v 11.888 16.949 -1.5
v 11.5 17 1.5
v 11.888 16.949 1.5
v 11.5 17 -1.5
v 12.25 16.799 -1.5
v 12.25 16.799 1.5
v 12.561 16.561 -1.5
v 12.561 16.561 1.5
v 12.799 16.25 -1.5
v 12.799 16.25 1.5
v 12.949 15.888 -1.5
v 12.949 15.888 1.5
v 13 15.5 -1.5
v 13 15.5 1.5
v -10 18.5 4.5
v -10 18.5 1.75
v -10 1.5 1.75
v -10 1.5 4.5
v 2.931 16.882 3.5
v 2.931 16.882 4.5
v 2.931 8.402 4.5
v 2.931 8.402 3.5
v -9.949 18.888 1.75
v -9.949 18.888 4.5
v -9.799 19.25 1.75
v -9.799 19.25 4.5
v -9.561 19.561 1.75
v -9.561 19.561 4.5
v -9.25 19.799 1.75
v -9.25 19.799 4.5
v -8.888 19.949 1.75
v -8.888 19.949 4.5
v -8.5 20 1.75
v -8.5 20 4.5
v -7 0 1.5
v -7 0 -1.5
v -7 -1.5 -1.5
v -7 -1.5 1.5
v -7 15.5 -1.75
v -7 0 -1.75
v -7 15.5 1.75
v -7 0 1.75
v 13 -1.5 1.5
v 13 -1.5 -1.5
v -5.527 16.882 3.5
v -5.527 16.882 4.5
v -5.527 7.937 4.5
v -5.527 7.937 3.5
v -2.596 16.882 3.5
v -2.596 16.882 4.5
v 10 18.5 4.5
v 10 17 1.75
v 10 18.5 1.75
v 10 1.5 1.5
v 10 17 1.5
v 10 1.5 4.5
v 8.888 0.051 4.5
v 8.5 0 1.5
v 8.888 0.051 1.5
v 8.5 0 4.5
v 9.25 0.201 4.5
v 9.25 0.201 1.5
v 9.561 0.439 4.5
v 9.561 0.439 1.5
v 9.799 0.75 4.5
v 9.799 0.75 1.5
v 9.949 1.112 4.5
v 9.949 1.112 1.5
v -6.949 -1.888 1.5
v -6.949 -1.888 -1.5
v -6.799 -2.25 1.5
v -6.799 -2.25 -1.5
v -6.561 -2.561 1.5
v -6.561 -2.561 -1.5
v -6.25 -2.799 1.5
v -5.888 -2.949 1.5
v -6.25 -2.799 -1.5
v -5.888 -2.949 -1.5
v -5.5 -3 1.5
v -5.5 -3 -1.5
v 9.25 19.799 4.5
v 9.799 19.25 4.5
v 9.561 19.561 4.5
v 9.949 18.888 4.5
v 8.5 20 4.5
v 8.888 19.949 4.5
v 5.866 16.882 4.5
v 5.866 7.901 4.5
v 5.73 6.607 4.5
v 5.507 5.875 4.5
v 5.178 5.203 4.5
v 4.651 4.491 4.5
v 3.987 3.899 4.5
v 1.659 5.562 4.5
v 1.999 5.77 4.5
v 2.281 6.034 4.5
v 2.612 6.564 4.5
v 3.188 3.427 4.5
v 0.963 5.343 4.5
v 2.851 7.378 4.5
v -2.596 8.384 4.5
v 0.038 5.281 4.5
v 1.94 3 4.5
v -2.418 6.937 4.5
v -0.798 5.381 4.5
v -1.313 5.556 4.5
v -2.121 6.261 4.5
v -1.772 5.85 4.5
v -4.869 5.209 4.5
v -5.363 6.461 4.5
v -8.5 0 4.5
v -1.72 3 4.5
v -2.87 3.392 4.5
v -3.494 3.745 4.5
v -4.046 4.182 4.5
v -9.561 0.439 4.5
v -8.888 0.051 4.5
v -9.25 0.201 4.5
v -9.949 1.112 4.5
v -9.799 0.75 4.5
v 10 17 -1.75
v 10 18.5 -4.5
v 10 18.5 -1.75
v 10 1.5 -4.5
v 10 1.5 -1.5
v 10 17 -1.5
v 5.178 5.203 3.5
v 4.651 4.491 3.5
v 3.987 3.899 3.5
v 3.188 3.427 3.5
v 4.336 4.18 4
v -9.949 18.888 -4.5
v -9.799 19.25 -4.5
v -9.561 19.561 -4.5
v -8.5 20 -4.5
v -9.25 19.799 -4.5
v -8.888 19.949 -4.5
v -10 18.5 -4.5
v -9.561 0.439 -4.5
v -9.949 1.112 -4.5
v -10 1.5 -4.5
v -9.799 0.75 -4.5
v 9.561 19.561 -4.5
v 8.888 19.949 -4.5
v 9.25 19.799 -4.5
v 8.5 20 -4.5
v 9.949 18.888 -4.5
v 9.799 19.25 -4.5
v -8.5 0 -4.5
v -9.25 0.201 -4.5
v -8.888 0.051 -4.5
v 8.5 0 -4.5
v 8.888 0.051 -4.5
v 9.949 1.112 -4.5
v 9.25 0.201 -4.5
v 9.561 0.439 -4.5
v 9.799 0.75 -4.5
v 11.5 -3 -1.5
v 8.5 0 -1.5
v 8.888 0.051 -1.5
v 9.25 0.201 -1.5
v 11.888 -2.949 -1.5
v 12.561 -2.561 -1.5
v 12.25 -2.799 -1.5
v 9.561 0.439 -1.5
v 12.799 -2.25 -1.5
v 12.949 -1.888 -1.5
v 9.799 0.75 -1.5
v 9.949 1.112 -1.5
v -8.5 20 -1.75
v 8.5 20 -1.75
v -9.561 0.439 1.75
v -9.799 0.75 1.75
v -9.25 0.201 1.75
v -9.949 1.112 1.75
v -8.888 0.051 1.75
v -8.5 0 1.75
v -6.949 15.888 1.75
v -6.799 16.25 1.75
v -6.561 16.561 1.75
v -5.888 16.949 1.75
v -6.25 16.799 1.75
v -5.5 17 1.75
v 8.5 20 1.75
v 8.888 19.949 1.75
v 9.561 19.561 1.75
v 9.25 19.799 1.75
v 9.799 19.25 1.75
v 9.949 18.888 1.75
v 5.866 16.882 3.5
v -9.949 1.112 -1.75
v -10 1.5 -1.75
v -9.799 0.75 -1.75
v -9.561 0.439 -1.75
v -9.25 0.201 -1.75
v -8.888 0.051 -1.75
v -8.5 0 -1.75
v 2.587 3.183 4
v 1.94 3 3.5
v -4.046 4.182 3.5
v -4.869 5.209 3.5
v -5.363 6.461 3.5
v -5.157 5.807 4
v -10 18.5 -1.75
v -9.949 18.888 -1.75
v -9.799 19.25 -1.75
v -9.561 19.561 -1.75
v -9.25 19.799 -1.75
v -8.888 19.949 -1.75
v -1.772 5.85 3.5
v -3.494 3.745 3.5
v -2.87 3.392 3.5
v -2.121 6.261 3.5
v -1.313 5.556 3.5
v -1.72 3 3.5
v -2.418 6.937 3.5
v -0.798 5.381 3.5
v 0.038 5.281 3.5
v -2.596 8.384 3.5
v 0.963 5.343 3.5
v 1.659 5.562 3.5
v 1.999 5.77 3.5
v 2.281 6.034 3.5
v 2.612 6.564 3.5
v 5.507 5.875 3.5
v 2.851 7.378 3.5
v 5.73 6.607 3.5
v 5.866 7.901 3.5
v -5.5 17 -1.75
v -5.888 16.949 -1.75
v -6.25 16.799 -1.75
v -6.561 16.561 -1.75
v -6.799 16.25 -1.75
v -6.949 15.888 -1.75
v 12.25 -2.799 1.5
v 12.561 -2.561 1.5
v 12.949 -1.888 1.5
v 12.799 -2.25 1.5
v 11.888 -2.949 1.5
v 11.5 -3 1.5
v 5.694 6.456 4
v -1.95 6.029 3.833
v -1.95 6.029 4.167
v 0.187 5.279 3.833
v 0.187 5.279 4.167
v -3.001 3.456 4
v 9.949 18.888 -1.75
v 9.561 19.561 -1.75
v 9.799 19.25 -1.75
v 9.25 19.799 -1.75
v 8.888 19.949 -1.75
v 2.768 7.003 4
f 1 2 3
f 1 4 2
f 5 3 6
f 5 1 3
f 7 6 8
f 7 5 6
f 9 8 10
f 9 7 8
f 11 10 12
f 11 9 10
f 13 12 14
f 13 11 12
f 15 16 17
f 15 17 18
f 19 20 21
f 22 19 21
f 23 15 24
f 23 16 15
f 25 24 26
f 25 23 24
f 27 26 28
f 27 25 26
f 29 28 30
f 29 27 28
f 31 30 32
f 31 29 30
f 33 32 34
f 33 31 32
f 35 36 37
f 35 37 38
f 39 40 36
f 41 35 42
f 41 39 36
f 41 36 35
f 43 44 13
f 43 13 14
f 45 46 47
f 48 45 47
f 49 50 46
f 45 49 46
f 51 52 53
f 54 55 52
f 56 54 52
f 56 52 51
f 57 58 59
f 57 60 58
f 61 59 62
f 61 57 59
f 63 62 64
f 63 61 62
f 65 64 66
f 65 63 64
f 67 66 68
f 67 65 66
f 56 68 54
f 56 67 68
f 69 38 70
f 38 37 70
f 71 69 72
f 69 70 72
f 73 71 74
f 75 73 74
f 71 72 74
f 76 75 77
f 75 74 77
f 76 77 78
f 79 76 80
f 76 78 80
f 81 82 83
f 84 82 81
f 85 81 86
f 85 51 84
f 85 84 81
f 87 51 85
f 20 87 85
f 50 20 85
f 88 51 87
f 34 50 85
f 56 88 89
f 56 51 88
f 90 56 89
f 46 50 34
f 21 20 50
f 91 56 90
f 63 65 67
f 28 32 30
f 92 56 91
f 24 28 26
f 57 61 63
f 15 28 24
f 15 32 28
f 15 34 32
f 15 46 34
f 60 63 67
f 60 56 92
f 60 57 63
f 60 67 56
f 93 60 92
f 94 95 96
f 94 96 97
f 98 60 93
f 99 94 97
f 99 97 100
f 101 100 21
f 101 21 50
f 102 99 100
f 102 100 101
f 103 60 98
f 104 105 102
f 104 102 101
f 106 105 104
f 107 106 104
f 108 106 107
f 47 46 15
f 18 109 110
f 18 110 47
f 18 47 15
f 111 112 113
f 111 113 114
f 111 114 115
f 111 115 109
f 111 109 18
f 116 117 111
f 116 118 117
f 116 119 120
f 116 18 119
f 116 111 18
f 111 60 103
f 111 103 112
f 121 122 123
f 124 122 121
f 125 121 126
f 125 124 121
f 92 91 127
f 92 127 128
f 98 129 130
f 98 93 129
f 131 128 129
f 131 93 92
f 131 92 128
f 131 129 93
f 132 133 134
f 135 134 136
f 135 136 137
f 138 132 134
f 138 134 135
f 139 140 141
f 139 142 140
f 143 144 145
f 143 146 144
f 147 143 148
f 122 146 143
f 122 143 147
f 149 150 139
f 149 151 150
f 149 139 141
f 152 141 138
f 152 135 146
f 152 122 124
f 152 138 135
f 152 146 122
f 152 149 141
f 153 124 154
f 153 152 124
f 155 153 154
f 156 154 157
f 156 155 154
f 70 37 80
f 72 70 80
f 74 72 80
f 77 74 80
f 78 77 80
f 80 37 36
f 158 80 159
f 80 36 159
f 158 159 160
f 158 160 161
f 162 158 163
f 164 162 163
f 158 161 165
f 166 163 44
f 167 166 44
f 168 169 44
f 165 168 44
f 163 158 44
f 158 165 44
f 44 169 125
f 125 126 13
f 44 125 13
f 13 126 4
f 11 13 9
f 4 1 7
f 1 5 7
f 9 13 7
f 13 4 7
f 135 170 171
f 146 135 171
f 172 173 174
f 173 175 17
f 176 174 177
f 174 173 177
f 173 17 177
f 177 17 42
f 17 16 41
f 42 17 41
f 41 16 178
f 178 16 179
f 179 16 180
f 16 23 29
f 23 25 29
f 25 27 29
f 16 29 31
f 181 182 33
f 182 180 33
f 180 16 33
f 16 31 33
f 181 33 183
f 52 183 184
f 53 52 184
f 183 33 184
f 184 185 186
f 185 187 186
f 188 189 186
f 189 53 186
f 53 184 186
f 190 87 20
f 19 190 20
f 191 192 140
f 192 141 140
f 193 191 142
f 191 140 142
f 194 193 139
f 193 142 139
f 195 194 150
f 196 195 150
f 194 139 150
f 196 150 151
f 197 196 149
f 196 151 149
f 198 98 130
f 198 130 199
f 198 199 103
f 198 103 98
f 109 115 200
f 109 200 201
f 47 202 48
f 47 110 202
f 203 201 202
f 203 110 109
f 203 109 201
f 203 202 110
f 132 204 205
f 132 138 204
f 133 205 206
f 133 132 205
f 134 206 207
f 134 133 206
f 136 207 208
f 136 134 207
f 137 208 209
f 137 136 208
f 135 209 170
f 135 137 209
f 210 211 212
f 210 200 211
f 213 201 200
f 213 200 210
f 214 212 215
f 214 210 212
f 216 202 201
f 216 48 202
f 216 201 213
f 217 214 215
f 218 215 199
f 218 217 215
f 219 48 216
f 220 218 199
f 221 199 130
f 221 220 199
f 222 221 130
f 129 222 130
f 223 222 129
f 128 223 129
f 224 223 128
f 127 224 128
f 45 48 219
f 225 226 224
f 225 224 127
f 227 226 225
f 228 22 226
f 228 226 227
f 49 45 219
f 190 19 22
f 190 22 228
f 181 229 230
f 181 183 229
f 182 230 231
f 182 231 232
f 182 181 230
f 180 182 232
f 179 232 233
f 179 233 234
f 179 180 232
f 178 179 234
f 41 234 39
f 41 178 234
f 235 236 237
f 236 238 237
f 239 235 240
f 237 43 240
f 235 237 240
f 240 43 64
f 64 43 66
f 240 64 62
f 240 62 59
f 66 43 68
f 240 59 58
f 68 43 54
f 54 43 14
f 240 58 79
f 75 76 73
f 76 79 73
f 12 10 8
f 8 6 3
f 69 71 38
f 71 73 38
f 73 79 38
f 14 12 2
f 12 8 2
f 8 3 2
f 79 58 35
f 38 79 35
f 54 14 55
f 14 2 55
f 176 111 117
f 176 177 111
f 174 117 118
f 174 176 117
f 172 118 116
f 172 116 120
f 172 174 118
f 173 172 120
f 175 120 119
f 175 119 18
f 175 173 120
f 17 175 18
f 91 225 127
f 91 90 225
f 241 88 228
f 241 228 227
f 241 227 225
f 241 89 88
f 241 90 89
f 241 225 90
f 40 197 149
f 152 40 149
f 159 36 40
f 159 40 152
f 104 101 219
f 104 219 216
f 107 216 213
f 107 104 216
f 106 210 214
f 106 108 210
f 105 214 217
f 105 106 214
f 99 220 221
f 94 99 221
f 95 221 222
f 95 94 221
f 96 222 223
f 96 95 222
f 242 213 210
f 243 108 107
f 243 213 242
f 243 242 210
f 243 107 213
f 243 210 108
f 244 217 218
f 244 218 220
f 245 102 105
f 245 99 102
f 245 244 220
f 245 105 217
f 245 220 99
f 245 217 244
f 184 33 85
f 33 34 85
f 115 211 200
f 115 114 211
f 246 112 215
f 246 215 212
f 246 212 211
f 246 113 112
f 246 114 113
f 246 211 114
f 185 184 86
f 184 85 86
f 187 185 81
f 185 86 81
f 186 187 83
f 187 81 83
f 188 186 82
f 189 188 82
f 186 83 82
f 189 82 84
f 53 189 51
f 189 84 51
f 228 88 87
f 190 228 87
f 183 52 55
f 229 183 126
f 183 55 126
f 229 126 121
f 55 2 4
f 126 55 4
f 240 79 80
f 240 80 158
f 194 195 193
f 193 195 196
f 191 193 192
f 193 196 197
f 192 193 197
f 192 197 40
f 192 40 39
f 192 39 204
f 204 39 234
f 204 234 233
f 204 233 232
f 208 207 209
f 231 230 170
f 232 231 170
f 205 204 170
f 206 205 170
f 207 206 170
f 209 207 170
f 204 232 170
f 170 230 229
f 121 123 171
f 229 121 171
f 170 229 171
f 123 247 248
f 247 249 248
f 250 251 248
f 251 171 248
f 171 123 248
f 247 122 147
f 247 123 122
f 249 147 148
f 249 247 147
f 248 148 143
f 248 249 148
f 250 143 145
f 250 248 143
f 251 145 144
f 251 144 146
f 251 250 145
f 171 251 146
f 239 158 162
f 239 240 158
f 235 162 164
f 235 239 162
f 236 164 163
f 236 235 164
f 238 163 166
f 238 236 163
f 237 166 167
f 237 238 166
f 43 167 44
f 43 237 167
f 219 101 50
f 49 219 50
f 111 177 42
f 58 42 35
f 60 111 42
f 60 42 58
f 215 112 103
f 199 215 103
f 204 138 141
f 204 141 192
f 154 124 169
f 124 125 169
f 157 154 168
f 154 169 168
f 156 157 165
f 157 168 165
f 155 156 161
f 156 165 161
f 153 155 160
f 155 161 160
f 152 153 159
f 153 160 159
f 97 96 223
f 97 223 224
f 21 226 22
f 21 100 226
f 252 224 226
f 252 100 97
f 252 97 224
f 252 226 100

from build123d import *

# Parameters (mm, degrees)
F0_W     = 14
F0_H     = 3
F0_W_2   = 3
F1_DEPTH = 20
F2_DEPTH = 3
F3_W     = 3
F3_H     = 3
F4_DEPTH = 100
F5_W     = 3
F5_H     = 3.5
F6_DEPTH = 100
F7_R     = 1.5
F9_DEPTH = 1


with BuildPart() as f1:
    # F0 (on Front) → F1 (new body)
    with BuildSketch(Plane.XZ):
        Polygon((10, 1.5), (10, 4.5), (-10, 4.5), (-10, 1.5), (-7, 1.5), (7, 1.5), align=None)
        Rectangle(F0_W, F0_H)
        with Locations((11.5, 0)):
            Rectangle(F0_W_2, F0_H)
        with Locations((8.5, 0)):
            Rectangle(F0_W_2, F0_H)
        with Locations((-8.5, 0)):
            Rectangle(F0_W_2, F0_H)
        Polygon((10, -4.5), (10, -1.5), (7, -1.5), (-7, -1.5), (-10, -1.5), (-10, -4.5), align=None)
    extrude(amount=-F1_DEPTH)

    # F0 (on Front) → F2 (join)
    with BuildSketch(Plane.XZ):
        with Locations((-8.5, 0)):
            Rectangle(F0_W_2, F0_H)
        Rectangle(F0_W, F0_H)
        with Locations((8.5, 0)):
            Rectangle(F0_W_2, F0_H)
        with Locations((11.5, 0)):
            Rectangle(F0_W_2, F0_H)
    extrude(amount=F2_DEPTH)

    # F3 (on face) → F4 (cut)
    with BuildSketch(Plane.YZ.offset(13)):
        Polygon((23, -1.75), (23, 1.75), (17, 1.75), (17, 1.5), (20, 1.5), (20, -1.5), (17, -1.5), (17, -1.75), align=None)
        with Locations((18.5, 0)):
            Rectangle(F3_W, F3_H)
    extrude(amount=-F4_DEPTH, mode=Mode.SUBTRACT)

    # F5 (on face) → F6 (cut)
    with BuildSketch(Plane(origin=(0, 17, 0), x_dir=(-1, 0, 0), z_dir=(0, 1, 0))):
        with Locations((11.5, 0)):
            Rectangle(F5_W, F5_H)
        with Locations((8.5, 0)):
            Rectangle(F5_W, F5_H)
    extrude(amount=-F6_DEPTH, mode=Mode.SUBTRACT)

    # F7
    f7_edges = [f1.edges().sort_by_distance(p)[0] for p in [
        (-7, -3, 0),
        (13, -3, 0),
        (10, 0, 3),
        (10, 0, -3),
        (-10, 0, -3.125),
        (-10, 0, 3.125),
        (-7, 17, 0),
        (-10, 20, 3.125),
        (-10, 20, -3.125),
        (13, 17, 0),
        (10, 20, 3.125),
        (10, 20, -3.125),
    ]]
    fillet(f7_edges, radius=F7_R)

    # F8 (on face) → F9 (cut)
    with BuildSketch(Plane.XY.offset(4.5)):
        with BuildLine():
            Line((-1.7204794807, 3), (1.9396642309, 3))
            add(Edge.make_bspline(
                [(3.1876434099, 3.4268663194), (2.6101370894, 3.1526013575), (1.9396642309, 3)],
                knots=[0, 0, 0, 0.4435987872, 0.4435987872, 0.4435987872], degree=2))
            add(Edge.make_bspline(
                [(5.177660771, 5.2026909722), (4.4895097293, 4.0451388889), (3.1876434099, 3.4268663194)],
                knots=[0, 0, 0, 1, 1, 1], degree=2))
            add(Edge.make_bspline(
                [(5.8658118126, 7.9006076389), (5.8658118126, 6.3602430556), (5.177660771, 5.2026909722)],
                knots=[0, 0, 0, 1, 1, 1], degree=2))
            Line((5.8658118126, 7.9006076389), (5.8658118126, 16.8815104167))
            Line((5.8658118126, 16.8815104167), (2.9309159793, 16.8815104167))
            Line((2.9309159793, 16.8815104167), (2.9309159793, 8.4019097222))
            add(Edge.make_bspline(
                [(2.2807423682, 6.0336371528), (2.9309159793, 6.7886284722), (2.9309159793, 8.4019097222)],
                knots=[0, 0, 0, 1, 1, 1], degree=2))
            add(Edge.make_bspline(
                [(0.187426396, 5.2786458333), (1.6305687571, 5.2786458333), (2.2807423682, 6.0336371528)],
                knots=[0, 0, 0, 1, 1, 1], degree=2))
            add(Edge.make_bspline(
                [(-1.9499433957, 6.0290798611), (-1.3043270763, 5.2786458333), (0.187426396, 5.2786458333)],
                knots=[0, 0, 0, 1, 1, 1], degree=2))
            add(Edge.make_bspline(
                [(-2.5955597151, 8.3836805556), (-2.5955597151, 6.7795138889), (-1.9499433957, 6.0290798611)],
                knots=[0, 0, 0, 1, 1, 1], degree=2))
            Line((-2.5955597151, 8.3836805556), (-2.5955597151, 16.8815104167))
            Line((-2.5955597151, 16.8815104167), (-5.527417354, 16.8815104167))
            Line((-5.527417354, 16.8815104167), (-5.527417354, 7.9370659722))
            add(Edge.make_bspline(
                [(-4.0462975624, 4.1818576389), (-5.527417354, 5.5551215278), (-5.527417354, 7.9370659722)],
                knots=[0, 0, 0, 1, 1, 1], degree=2))
            add(Edge.make_bspline(
                [(-1.7204794807, 3), (-3.1181346209, 3.3212839988), (-4.0462975624, 4.1818576389)],
                knots=[0.3733370206, 0.3733370206, 0.3733370206, 1, 1, 1], degree=2))
        make_face()
    extrude(amount=-F9_DEPTH, mode=Mode.SUBTRACT)


solid = f1.part
